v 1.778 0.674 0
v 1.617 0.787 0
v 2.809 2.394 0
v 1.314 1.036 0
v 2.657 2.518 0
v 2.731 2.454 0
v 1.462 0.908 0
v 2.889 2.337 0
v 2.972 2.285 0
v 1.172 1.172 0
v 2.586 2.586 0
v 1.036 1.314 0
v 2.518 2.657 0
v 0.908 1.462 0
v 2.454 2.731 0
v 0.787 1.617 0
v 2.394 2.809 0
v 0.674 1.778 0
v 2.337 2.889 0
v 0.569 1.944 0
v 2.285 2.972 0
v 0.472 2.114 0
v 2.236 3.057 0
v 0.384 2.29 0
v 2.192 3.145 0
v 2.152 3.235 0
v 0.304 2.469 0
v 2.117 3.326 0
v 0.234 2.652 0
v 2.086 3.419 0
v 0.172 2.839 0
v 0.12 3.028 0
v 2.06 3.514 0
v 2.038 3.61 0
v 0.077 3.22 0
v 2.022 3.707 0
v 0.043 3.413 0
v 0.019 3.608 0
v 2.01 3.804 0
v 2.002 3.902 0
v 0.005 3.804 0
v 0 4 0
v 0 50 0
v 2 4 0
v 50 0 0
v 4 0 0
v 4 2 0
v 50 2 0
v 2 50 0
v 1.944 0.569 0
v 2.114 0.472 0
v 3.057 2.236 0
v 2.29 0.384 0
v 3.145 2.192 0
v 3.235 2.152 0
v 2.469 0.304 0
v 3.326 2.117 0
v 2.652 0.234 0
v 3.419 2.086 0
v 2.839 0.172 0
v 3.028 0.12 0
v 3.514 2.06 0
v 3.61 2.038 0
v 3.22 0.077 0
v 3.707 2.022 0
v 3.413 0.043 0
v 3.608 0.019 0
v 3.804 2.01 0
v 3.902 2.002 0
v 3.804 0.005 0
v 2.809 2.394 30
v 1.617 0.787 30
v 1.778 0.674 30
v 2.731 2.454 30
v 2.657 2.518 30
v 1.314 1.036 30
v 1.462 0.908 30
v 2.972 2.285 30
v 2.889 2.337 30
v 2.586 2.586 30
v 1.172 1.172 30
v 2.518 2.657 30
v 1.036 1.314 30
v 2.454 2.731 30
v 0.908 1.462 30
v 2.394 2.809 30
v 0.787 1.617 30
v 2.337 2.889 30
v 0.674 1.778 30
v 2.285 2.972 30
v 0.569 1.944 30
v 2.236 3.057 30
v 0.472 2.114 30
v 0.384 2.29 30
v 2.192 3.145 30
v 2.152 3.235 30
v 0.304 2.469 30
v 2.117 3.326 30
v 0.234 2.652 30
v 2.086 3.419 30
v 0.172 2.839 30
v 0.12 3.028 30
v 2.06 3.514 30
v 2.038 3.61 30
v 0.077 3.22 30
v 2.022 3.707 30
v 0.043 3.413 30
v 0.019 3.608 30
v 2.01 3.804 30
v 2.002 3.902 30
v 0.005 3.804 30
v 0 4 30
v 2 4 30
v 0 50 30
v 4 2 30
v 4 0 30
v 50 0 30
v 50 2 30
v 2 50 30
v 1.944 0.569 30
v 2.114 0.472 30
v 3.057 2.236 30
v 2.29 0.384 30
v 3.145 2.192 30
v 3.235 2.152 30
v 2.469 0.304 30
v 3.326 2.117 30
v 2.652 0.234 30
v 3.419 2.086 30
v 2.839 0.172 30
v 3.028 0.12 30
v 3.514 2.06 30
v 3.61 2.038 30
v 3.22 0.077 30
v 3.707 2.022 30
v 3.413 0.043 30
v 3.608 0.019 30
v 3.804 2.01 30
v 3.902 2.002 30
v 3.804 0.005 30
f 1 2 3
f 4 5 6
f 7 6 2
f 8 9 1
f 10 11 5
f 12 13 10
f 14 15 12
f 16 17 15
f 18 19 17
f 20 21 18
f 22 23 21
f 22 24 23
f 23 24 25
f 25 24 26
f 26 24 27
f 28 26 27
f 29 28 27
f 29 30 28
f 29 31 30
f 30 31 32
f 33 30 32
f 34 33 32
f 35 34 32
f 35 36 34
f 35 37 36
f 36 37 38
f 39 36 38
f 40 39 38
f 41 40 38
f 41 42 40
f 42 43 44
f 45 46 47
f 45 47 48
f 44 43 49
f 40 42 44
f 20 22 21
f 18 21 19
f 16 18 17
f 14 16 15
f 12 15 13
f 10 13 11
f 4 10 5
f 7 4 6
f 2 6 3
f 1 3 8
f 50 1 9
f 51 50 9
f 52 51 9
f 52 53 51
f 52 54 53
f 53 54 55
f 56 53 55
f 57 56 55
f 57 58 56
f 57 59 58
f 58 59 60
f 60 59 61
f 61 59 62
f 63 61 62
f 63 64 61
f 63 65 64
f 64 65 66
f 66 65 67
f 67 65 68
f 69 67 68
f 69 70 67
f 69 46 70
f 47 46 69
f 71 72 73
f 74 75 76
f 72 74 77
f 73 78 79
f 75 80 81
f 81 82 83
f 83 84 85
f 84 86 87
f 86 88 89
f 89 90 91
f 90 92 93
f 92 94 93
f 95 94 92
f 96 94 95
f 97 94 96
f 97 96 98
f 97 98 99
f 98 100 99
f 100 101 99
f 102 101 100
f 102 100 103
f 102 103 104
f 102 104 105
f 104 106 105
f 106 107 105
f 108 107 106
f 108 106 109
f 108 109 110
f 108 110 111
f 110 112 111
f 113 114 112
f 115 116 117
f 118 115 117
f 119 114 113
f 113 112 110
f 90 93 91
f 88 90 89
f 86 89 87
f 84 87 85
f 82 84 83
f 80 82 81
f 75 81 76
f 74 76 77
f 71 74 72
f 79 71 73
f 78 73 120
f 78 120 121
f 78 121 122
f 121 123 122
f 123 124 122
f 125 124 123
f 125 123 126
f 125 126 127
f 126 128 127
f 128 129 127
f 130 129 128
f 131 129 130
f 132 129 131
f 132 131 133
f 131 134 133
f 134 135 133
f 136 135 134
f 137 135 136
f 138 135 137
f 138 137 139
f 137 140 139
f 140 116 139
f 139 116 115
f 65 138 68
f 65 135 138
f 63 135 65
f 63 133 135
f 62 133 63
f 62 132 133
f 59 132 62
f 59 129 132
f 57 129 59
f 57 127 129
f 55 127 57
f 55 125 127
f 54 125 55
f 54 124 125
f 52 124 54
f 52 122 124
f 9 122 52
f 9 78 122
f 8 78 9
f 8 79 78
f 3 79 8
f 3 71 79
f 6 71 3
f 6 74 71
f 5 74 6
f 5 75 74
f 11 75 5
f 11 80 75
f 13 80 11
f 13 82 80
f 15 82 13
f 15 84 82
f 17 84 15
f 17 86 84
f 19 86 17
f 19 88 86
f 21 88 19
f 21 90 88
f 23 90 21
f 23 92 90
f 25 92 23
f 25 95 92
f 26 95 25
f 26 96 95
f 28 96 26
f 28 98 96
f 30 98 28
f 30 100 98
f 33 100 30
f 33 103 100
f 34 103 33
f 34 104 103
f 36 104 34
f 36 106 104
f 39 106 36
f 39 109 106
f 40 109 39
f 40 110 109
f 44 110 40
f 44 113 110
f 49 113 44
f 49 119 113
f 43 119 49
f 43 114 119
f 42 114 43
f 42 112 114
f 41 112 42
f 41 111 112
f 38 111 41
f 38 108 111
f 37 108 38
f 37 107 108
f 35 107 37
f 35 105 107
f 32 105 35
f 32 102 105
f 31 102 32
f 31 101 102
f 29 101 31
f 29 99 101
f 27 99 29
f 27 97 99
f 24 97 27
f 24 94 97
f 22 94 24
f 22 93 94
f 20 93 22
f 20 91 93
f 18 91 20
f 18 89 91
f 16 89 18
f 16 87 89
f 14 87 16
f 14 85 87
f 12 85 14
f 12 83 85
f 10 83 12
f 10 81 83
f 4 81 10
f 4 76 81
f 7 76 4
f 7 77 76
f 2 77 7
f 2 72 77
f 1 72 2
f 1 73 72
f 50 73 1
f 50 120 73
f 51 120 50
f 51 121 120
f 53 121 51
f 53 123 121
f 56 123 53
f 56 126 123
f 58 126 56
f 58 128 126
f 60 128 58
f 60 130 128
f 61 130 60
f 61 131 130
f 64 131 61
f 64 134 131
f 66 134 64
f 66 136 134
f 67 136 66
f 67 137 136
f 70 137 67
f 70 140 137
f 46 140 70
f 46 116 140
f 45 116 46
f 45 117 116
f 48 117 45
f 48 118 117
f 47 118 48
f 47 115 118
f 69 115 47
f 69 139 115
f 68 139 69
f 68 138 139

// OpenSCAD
$fn = 128;

outside_flange_a_mm = 50;
outside_flange_b_mm = 50;
width_mm = 30;
thickness_mm = 2.0;
inside_radius_mm = 2.0;
bend_angle_deg = 90;
k_factor = 0.45;

outside_radius_mm = inside_radius_mm + thickness_mm;
bend_angle_rad = bend_angle_deg * PI / 180;
outside_setback_mm = outside_radius_mm * tan(bend_angle_deg / 2);
bend_allowance_mm = bend_angle_rad * (inside_radius_mm + k_factor * thickness_mm);

flat_leg_a_mm = outside_flange_a_mm - outside_setback_mm;
flat_leg_b_mm = outside_flange_b_mm - outside_setback_mm;
flat_length_mm = flat_leg_a_mm + flat_leg_b_mm + bend_allowance_mm;

echo(str(
    "MAKERBENCH-SHEETMETAL: {",
    "\"thickness_mm\": ", thickness_mm, ", ",
    "\"bend_radius_mm\": ", inside_radius_mm, ", ",
    "\"developed_flat_length_mm\": ", flat_length_mm,
    "}"
));

module bend_sector_2d() {
    intersection() {
        difference() {
            translate([outside_radius_mm, outside_radius_mm])
                circle(r = outside_radius_mm);
            translate([outside_radius_mm, outside_radius_mm])
                circle(r = inside_radius_mm);
        }
        square([outside_radius_mm, outside_radius_mm]);
    }
}

module bracket_profile_2d() {
    union() {
        translate([outside_radius_mm, 0])
            square([outside_flange_a_mm - outside_radius_mm, thickness_mm]);

        translate([0, outside_radius_mm])
            square([thickness_mm, outside_flange_b_mm - outside_radius_mm]);

        bend_sector_2d();
    }
}

linear_extrude(height = width_mm, center = false, convexity = 10)
    bracket_profile_2d();
